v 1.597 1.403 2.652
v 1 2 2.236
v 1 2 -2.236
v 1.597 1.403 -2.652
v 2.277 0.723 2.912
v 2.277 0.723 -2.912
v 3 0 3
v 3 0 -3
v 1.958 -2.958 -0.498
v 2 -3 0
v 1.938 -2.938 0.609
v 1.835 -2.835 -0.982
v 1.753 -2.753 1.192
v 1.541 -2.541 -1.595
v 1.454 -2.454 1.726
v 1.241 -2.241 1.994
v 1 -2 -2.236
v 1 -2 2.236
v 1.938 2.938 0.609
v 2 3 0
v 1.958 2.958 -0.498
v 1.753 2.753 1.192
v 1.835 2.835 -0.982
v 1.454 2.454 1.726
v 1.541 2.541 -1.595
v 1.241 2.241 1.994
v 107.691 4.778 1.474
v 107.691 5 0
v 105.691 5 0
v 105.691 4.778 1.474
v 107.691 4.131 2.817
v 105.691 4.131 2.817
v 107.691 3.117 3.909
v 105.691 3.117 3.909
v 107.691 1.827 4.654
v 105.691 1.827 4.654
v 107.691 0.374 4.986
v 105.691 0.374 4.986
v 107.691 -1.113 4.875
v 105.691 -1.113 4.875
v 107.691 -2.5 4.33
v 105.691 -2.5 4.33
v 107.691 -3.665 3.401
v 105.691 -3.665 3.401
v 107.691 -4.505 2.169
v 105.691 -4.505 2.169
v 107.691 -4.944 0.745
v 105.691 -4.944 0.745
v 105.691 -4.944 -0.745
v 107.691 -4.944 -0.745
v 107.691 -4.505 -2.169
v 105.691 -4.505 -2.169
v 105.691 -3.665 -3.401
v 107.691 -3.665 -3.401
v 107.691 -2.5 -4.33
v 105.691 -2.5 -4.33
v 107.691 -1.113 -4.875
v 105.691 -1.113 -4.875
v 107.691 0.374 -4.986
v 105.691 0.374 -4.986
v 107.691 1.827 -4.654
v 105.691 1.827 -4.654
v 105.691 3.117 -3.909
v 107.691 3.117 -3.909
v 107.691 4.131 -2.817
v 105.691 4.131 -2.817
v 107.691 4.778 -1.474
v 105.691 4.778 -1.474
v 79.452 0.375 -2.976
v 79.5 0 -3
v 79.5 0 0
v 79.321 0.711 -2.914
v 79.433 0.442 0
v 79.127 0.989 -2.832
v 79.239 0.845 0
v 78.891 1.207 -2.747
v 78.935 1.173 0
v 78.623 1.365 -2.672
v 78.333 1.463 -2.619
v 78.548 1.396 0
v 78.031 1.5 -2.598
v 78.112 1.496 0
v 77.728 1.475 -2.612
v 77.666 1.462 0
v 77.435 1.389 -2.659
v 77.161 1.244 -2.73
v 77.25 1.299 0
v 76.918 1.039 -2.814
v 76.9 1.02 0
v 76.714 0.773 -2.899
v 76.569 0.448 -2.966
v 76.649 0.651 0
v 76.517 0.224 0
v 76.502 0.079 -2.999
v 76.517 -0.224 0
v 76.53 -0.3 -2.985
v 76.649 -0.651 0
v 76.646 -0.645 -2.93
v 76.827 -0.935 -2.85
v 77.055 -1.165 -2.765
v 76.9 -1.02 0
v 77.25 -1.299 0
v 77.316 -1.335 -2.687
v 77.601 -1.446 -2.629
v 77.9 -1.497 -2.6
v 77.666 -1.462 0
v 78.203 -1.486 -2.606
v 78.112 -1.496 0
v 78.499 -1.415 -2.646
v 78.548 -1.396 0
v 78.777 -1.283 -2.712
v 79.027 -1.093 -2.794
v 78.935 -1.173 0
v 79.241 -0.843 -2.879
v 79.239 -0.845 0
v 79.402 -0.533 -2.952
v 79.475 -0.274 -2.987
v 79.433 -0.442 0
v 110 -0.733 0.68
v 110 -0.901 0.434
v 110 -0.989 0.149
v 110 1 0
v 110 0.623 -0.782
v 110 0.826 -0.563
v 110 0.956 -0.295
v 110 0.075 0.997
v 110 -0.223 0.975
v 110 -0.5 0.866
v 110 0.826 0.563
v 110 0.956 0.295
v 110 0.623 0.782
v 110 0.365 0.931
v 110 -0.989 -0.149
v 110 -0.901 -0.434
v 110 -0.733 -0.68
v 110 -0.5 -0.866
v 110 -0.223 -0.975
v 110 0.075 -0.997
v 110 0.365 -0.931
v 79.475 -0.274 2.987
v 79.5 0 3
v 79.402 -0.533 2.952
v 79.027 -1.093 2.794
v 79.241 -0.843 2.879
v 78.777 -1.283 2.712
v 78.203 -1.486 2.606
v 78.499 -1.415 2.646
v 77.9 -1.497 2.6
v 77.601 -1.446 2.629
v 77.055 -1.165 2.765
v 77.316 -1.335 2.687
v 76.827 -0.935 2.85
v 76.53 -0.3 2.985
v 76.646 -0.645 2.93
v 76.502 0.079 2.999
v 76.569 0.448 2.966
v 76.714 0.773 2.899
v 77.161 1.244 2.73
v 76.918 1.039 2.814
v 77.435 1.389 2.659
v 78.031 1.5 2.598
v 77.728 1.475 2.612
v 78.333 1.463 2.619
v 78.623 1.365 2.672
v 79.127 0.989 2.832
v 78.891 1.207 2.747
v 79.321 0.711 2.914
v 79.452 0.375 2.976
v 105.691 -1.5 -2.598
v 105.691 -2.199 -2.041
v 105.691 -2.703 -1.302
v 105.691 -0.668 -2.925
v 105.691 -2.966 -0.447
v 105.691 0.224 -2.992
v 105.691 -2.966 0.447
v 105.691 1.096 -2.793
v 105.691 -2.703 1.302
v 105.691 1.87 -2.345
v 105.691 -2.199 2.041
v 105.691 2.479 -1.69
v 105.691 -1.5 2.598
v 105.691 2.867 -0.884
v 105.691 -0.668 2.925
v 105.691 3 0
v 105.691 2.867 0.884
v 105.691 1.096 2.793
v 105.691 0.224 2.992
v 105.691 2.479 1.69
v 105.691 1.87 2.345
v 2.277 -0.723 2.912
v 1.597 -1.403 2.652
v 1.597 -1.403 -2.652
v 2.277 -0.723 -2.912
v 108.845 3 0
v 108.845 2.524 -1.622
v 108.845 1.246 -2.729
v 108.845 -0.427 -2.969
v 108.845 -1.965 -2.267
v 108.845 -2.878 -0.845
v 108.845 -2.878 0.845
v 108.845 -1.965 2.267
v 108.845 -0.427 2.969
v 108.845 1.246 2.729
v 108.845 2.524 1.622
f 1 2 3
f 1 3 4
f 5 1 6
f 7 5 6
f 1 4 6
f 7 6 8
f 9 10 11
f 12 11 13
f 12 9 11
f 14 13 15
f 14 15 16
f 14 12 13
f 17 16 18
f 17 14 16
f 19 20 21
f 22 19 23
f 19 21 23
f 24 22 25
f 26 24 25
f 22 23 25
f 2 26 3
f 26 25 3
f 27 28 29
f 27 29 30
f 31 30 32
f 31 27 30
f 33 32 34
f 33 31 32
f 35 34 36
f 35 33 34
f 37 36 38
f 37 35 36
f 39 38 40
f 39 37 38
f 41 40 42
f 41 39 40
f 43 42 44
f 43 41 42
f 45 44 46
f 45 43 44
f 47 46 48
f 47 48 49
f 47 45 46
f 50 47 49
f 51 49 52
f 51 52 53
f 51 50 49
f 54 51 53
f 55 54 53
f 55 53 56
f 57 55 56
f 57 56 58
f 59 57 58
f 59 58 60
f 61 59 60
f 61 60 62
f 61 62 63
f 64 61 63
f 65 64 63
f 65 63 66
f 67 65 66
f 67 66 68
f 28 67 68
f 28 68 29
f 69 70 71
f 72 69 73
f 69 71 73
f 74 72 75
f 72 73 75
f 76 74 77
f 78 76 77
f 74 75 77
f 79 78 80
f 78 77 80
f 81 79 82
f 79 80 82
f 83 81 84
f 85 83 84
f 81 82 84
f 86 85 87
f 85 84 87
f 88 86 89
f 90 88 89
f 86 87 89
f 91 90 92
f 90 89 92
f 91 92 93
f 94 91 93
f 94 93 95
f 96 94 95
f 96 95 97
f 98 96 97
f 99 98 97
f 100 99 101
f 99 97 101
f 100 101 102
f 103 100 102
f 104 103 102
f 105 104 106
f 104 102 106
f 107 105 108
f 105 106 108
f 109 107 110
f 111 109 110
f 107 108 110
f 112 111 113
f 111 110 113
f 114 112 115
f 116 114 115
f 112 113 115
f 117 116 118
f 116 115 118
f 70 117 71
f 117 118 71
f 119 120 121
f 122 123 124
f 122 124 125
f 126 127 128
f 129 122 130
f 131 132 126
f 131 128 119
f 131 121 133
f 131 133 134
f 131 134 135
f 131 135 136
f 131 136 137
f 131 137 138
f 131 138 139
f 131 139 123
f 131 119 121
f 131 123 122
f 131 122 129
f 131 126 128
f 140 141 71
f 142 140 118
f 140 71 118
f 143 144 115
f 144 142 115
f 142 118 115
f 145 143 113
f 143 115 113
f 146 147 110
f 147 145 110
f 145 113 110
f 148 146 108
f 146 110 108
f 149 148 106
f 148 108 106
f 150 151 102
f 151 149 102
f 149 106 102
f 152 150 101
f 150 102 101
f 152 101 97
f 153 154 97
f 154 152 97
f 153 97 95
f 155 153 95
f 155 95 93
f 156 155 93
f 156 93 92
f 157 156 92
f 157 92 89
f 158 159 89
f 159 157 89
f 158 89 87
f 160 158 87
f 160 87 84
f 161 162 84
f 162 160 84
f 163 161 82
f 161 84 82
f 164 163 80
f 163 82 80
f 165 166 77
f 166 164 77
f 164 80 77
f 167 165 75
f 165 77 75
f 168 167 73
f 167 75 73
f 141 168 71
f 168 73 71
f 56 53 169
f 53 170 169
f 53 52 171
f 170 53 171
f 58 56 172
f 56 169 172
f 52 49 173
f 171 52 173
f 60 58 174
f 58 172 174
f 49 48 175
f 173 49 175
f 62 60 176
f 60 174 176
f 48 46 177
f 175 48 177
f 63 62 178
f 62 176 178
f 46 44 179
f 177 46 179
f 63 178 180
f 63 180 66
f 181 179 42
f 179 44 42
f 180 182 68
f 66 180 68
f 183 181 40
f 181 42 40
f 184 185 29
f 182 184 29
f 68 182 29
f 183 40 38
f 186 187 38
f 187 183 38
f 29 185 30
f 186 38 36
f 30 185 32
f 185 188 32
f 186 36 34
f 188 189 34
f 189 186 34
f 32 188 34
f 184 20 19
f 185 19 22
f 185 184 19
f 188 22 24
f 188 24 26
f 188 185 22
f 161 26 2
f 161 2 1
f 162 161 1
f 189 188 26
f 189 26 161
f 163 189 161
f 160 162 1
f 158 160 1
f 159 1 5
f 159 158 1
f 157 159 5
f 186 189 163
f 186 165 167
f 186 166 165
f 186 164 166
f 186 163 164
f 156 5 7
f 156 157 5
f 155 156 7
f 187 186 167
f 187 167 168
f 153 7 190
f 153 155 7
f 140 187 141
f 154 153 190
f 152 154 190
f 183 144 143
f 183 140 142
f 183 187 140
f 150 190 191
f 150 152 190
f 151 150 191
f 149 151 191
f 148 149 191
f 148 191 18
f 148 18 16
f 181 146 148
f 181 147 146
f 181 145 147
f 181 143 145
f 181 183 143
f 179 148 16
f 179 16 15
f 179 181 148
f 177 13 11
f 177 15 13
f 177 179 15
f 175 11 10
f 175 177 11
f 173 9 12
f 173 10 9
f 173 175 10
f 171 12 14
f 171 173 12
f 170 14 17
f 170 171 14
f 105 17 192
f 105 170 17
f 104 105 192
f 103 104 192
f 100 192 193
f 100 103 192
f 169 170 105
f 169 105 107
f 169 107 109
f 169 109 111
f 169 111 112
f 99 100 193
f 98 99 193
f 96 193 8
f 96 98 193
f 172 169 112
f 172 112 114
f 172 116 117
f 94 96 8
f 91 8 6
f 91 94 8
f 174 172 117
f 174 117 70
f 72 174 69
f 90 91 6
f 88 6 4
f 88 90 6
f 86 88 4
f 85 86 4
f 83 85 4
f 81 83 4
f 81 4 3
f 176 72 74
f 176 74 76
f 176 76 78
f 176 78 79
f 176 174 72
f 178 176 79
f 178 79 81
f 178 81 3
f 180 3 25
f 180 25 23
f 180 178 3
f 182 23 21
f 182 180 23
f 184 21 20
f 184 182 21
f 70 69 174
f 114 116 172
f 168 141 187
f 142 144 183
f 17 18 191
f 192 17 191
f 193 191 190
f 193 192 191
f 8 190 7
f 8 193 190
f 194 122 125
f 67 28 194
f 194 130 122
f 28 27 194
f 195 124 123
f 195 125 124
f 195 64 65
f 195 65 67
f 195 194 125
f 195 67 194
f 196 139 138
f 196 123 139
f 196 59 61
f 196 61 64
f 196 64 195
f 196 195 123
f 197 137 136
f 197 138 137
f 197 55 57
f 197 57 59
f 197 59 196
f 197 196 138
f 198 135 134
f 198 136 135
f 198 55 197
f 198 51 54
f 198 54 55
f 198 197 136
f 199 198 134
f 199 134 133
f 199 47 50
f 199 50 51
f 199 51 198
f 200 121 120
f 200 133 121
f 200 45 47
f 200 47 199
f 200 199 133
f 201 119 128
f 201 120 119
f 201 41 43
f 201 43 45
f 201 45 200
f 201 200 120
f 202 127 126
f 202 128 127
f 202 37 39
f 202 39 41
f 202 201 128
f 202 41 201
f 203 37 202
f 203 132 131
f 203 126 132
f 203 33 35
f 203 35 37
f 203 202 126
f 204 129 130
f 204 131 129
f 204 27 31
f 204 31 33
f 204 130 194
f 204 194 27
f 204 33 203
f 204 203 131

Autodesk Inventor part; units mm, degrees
ref_plane "YZ Plane" through (0, 0, 0) normal (1, 0, 0) x (0, 1, 0)
ref_plane "XZ Plane" through (0, 0, 0) normal (0, 1, 0) x (-1, 0, 0)
ref_plane "XY Plane" through (0, 0, 0) normal (0, 0, 1) x (1, 0, 0)
sketch "Sketch1" plane through (0, 0, 0) normal (0, 0, 1) x (1, 0, 0)
  line L0 (-22.1155, 0) -> (132.6928, 0) projected
  line L1 (0, -4.6) -> (0, 6.6) projected
  line L2 (0, 3) -> (105.6906, 3)
  line L3 (105.6906, 3) -> (105.6906, 5)
  line L4 (105.6906, 5) -> (107.6906, 5)
  line L5 (107.6906, 5) -> (110.5774, 0)
  line L6 (0, 3) -> (3, 0)
  line L7 (0, 3) -> (0, 0)
  line L8 (110, 1) -> (110, 0)
  line L9 (0, -3) -> (3, 0)
  circle A0 centre (78, 0) radius 1.5
  line L10 (2, 3) -> (1, 2)
  line L11 (0, -3) -> (105.6906, -3)
  line L12 (2, -3) -> (1, -2)
  point P0 (1, -2)
  dimension "d0" = 6
  dimension "d2" = 60
  dimension "d3" = 2
  dimension "d4" = 10
  dimension "d5" = 2
  dimension "d6" = 110
  dimension "d10" = 3
  dimension "d14" = 2
  dimension "d16" = 32
revolve "Revolution1" add sketch "Sketch1" angle 360 about axis through (-10, 0, 0) along (1, 0, 0) picked at (78.1773, 0.4675) contours L6 L10 L2 L3 L4 L5 L8 L0 A0 | L2 L10 L6 | A0 L0
extrude "Extrusion1" cut sketch "Sketch1" along normal through all both and the other way through all contours L1 L6 L0 | L0 L9 L1 | L9 L12 L11 | L2 L10 L6 | A0 L0 | L0 A0
properties part number "TW2A-002" material "Steel, Carbon"
